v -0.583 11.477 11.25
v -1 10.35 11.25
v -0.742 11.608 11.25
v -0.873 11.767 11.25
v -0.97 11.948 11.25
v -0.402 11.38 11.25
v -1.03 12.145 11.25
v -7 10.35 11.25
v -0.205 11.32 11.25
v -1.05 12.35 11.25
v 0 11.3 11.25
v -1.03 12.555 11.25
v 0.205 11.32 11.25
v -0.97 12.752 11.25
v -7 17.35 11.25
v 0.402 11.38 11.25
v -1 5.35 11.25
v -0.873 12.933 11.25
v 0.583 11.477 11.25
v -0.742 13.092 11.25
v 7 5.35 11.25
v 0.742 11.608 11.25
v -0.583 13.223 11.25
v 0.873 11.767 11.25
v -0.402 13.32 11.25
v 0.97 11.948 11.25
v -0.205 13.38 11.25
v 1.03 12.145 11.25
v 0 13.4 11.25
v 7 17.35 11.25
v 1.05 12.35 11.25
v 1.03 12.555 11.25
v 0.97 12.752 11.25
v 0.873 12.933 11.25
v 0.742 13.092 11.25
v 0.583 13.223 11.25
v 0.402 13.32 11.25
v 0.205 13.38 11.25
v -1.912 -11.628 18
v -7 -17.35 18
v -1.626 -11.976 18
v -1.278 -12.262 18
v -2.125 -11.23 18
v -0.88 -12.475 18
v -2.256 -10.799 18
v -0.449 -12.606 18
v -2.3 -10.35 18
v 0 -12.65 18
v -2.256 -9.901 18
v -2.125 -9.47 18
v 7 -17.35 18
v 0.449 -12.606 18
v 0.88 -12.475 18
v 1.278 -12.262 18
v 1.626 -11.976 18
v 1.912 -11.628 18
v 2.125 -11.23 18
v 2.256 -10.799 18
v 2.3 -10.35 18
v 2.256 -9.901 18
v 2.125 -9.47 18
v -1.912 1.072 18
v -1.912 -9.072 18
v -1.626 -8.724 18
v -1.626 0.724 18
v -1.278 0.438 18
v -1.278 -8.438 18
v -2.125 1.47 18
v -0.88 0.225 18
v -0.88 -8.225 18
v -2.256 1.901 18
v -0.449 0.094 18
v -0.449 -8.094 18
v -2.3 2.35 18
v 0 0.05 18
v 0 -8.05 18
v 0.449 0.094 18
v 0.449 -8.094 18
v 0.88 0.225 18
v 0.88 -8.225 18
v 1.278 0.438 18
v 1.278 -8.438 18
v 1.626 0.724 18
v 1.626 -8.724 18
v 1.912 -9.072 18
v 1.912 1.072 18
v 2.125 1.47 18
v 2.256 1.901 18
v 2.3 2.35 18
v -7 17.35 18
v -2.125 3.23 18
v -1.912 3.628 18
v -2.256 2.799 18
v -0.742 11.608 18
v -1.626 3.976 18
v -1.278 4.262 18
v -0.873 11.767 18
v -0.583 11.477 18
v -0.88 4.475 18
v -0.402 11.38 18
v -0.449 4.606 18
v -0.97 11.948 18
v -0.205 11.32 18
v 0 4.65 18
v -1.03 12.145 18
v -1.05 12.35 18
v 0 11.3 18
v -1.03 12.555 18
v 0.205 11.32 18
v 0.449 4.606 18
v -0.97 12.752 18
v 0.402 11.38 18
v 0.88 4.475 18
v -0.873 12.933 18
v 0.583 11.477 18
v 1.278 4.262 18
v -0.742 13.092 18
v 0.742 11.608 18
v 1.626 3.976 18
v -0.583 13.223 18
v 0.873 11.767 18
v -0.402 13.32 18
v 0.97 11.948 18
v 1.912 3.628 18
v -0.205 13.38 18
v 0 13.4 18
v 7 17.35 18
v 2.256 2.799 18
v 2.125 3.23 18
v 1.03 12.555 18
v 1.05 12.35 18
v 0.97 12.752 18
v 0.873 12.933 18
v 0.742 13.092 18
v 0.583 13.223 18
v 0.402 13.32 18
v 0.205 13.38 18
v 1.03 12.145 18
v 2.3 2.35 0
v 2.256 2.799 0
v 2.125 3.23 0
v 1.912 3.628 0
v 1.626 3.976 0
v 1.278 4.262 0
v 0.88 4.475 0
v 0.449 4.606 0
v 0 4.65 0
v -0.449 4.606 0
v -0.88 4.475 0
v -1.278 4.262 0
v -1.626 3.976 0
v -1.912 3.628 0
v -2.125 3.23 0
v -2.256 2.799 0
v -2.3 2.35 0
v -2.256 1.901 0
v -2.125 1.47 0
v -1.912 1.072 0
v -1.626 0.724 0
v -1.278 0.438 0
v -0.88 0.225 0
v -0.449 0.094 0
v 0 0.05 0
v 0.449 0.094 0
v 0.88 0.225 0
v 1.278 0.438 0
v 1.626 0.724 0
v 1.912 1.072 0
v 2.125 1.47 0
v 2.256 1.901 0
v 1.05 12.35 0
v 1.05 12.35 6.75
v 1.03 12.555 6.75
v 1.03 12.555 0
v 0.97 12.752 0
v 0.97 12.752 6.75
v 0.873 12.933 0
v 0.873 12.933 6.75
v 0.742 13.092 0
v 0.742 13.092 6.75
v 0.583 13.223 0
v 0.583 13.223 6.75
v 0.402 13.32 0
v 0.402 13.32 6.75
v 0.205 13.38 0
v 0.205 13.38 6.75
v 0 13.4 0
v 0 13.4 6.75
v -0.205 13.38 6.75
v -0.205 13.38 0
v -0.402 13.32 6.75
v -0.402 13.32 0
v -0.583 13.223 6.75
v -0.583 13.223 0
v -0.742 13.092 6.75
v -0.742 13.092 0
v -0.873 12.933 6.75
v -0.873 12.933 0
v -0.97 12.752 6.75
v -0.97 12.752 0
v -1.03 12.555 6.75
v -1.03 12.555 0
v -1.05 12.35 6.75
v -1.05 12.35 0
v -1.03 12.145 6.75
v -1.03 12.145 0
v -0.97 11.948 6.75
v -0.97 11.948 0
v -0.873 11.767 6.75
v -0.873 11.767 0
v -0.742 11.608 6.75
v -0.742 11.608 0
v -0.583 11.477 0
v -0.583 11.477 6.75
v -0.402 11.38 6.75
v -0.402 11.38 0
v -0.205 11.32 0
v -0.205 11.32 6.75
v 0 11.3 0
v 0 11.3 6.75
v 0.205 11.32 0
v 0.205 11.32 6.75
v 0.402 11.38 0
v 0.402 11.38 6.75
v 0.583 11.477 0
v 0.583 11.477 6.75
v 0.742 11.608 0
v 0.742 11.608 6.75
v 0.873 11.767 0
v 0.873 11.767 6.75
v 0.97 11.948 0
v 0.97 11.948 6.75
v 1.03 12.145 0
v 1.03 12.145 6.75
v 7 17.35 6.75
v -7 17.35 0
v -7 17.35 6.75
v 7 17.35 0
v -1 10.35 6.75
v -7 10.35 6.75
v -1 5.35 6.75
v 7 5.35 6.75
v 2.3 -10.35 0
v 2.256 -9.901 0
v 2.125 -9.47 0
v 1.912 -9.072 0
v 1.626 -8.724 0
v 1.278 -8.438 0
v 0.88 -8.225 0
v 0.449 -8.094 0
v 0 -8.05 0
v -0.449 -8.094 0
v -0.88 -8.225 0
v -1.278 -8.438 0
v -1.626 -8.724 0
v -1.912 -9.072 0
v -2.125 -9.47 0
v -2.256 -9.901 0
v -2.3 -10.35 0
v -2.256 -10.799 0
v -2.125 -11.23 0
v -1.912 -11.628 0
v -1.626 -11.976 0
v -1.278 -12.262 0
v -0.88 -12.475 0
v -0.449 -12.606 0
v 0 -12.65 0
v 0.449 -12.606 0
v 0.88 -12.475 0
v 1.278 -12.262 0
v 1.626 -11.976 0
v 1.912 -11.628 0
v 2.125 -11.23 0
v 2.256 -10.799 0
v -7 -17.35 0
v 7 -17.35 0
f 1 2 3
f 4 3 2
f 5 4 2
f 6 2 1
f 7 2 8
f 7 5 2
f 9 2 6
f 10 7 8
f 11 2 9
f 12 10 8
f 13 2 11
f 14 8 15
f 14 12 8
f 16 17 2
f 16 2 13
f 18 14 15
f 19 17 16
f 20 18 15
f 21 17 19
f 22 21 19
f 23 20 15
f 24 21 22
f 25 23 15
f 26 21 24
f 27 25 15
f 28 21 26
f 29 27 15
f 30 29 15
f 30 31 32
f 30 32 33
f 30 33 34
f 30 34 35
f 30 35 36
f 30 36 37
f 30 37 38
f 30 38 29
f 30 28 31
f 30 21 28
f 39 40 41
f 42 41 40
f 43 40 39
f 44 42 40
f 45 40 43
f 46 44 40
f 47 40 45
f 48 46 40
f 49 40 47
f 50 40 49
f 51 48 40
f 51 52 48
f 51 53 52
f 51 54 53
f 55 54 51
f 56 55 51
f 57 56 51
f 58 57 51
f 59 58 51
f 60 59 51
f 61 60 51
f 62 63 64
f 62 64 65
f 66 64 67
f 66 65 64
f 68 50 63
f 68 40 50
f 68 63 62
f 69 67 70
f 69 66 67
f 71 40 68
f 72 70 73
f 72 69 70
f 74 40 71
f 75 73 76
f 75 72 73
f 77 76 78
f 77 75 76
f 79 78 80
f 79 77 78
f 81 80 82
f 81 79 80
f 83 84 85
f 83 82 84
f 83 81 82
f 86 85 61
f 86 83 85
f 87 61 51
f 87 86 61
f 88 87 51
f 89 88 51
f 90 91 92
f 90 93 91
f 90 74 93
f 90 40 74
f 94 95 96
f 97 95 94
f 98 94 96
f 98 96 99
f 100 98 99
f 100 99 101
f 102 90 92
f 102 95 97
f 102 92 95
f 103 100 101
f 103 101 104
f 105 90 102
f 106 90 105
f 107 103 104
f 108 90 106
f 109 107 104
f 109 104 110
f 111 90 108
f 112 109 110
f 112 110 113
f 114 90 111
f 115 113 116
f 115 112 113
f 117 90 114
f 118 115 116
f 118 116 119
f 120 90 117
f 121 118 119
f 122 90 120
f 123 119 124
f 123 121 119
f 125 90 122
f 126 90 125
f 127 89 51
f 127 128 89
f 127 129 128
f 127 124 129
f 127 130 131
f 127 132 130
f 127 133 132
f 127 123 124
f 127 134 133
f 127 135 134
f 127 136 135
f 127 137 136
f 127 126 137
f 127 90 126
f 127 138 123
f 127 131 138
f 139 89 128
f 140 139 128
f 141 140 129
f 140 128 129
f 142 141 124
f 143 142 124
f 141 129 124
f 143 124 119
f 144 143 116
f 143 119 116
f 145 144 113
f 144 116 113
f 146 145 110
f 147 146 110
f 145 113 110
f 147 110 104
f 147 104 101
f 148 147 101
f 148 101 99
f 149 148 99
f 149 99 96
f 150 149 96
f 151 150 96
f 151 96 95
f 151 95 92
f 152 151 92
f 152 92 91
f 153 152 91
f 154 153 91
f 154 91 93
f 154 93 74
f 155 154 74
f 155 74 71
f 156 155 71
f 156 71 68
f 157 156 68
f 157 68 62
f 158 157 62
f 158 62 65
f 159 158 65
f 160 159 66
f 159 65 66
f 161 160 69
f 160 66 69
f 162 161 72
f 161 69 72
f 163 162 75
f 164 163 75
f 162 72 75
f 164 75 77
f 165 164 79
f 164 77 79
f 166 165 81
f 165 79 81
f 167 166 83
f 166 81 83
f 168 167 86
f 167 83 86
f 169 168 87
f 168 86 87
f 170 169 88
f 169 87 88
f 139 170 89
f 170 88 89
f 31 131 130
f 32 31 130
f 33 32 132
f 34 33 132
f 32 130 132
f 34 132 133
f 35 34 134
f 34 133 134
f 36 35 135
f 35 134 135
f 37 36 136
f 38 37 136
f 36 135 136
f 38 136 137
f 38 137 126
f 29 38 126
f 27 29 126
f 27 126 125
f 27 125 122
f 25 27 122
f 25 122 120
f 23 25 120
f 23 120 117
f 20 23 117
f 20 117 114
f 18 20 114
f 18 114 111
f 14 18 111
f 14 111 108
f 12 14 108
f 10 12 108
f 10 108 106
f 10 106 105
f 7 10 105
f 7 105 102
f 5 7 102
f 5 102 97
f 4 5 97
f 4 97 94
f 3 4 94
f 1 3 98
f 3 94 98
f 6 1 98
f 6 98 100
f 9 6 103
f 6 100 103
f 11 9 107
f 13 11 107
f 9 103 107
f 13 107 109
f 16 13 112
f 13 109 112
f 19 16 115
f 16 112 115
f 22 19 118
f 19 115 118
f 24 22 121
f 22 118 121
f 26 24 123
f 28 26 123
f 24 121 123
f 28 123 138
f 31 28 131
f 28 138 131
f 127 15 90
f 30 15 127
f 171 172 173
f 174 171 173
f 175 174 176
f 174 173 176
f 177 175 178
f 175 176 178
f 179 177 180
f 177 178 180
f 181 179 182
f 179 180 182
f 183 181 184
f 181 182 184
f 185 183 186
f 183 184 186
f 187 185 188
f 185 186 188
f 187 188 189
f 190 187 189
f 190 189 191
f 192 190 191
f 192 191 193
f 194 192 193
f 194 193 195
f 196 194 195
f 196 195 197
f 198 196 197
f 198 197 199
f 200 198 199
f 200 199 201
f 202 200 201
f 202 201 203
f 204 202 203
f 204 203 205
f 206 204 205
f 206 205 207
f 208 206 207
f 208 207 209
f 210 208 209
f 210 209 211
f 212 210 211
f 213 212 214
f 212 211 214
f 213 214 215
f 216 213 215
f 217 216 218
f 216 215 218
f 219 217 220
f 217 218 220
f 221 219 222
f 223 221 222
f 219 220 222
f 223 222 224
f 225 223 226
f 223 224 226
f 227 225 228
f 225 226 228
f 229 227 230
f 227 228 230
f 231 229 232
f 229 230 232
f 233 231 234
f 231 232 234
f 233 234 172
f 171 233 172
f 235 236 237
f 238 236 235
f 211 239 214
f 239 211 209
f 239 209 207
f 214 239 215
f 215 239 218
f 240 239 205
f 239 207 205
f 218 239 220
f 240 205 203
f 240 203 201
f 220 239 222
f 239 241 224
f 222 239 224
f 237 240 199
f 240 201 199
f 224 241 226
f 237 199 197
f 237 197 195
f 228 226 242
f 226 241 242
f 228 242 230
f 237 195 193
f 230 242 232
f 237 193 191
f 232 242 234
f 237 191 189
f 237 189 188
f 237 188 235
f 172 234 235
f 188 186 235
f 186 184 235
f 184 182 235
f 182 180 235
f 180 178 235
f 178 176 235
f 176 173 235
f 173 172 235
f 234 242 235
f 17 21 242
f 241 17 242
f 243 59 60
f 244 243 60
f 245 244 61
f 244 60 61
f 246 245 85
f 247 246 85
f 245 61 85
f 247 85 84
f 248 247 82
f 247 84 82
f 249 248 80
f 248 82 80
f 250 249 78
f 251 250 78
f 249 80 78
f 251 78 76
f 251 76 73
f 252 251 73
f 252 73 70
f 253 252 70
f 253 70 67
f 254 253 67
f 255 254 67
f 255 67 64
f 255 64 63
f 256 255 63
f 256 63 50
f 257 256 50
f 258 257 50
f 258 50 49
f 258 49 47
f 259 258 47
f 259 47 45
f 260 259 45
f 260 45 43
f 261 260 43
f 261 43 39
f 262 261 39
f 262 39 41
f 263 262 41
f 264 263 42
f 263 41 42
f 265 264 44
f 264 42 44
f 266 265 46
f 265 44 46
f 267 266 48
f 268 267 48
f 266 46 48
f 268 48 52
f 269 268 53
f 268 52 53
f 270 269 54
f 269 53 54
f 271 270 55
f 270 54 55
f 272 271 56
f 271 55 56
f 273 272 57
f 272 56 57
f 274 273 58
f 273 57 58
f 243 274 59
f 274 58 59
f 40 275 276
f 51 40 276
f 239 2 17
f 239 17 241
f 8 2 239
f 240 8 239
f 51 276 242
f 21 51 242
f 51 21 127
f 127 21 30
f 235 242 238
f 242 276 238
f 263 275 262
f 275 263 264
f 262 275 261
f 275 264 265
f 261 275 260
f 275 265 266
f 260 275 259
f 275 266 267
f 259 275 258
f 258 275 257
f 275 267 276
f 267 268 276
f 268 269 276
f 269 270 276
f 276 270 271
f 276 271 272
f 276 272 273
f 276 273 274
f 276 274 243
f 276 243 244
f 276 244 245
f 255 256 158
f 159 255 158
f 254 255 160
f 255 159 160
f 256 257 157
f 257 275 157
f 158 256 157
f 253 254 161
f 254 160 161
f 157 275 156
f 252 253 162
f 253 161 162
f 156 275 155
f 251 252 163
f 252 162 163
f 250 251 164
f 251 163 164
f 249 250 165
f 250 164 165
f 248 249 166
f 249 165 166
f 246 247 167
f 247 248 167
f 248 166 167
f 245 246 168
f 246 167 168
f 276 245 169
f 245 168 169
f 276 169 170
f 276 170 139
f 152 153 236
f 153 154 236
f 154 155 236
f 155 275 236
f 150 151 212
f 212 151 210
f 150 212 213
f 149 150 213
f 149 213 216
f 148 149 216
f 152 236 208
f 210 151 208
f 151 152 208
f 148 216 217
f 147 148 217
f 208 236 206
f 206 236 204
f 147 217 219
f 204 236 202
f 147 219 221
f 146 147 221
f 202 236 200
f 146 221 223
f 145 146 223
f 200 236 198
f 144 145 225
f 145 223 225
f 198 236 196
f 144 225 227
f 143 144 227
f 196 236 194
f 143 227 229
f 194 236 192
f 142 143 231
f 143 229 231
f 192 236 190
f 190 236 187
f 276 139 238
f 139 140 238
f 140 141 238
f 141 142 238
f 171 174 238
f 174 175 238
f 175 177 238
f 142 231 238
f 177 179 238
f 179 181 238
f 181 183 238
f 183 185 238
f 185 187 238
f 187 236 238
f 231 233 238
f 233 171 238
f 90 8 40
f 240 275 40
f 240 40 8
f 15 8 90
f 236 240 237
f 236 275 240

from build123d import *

# Parameters (mm, degrees)
SKETCH2_W           = 14
SKETCH2_H           = 34.7
BOSS_EXTRUDE1_DEPTH = 18
SKETCH3_R           = 2.3
CUT_EXTRUDE1_DEPTH  = 26.961943302
SKETCH4_W           = 4.5
SKETCH4_H           = 12
CUT_EXTRUDE2_DEPTH  = 8
SKETCH5_R           = 1.05
CUT_EXTRUDE3_DEPTH  = 26.961943302
SKETCH8_W           = 4.5
SKETCH8_H           = 7
CUT_EXTRUDE6_DEPTH  = 29.653490189


with BuildPart() as part:
    # Sketch2 → Boss-Extrude1 (new body)
    with BuildSketch(Plane.XY):
        Rectangle(SKETCH2_W, SKETCH2_H)
    extrude(amount=BOSS_EXTRUDE1_DEPTH)

    # Sketch3 → Cut-Extrude1 (cut, through all)
    with BuildSketch(Plane.XY.offset(18)):
        with Locations((0, -10.35)):
            Circle(SKETCH3_R)
        with Locations((0, 2.35)):
            Circle(SKETCH3_R)
    extrude(amount=-CUT_EXTRUDE1_DEPTH, mode=Mode.SUBTRACT)

    # Sketch4 → Cut-Extrude2 (cut)
    with BuildSketch(Plane(origin=(7, 0, 0), x_dir=(0, 0, -1), z_dir=(1, 0, 0))):
        with Locations((-9, 11.35)):
            Rectangle(SKETCH4_W, SKETCH4_H)
    extrude(amount=-CUT_EXTRUDE2_DEPTH, mode=Mode.SUBTRACT)

    # Sketch5 → Cut-Extrude3 (cut, through all)
    with BuildSketch(Plane.XY.offset(18)):
        with Locations((0, 12.35)):
            Circle(SKETCH5_R)
    extrude(amount=-CUT_EXTRUDE3_DEPTH, mode=Mode.SUBTRACT)

    # Sketch8 → Cut-Extrude6 (cut, through all)
    with BuildSketch(Plane(origin=(7, 0, 0), x_dir=(0, 0, -1), z_dir=(1, 0, 0))):
        with Locations((-9, 13.85)):
            Rectangle(SKETCH8_W, SKETCH8_H)
    extrude(amount=-CUT_EXTRUDE6_DEPTH, mode=Mode.SUBTRACT)


solid = part.part
